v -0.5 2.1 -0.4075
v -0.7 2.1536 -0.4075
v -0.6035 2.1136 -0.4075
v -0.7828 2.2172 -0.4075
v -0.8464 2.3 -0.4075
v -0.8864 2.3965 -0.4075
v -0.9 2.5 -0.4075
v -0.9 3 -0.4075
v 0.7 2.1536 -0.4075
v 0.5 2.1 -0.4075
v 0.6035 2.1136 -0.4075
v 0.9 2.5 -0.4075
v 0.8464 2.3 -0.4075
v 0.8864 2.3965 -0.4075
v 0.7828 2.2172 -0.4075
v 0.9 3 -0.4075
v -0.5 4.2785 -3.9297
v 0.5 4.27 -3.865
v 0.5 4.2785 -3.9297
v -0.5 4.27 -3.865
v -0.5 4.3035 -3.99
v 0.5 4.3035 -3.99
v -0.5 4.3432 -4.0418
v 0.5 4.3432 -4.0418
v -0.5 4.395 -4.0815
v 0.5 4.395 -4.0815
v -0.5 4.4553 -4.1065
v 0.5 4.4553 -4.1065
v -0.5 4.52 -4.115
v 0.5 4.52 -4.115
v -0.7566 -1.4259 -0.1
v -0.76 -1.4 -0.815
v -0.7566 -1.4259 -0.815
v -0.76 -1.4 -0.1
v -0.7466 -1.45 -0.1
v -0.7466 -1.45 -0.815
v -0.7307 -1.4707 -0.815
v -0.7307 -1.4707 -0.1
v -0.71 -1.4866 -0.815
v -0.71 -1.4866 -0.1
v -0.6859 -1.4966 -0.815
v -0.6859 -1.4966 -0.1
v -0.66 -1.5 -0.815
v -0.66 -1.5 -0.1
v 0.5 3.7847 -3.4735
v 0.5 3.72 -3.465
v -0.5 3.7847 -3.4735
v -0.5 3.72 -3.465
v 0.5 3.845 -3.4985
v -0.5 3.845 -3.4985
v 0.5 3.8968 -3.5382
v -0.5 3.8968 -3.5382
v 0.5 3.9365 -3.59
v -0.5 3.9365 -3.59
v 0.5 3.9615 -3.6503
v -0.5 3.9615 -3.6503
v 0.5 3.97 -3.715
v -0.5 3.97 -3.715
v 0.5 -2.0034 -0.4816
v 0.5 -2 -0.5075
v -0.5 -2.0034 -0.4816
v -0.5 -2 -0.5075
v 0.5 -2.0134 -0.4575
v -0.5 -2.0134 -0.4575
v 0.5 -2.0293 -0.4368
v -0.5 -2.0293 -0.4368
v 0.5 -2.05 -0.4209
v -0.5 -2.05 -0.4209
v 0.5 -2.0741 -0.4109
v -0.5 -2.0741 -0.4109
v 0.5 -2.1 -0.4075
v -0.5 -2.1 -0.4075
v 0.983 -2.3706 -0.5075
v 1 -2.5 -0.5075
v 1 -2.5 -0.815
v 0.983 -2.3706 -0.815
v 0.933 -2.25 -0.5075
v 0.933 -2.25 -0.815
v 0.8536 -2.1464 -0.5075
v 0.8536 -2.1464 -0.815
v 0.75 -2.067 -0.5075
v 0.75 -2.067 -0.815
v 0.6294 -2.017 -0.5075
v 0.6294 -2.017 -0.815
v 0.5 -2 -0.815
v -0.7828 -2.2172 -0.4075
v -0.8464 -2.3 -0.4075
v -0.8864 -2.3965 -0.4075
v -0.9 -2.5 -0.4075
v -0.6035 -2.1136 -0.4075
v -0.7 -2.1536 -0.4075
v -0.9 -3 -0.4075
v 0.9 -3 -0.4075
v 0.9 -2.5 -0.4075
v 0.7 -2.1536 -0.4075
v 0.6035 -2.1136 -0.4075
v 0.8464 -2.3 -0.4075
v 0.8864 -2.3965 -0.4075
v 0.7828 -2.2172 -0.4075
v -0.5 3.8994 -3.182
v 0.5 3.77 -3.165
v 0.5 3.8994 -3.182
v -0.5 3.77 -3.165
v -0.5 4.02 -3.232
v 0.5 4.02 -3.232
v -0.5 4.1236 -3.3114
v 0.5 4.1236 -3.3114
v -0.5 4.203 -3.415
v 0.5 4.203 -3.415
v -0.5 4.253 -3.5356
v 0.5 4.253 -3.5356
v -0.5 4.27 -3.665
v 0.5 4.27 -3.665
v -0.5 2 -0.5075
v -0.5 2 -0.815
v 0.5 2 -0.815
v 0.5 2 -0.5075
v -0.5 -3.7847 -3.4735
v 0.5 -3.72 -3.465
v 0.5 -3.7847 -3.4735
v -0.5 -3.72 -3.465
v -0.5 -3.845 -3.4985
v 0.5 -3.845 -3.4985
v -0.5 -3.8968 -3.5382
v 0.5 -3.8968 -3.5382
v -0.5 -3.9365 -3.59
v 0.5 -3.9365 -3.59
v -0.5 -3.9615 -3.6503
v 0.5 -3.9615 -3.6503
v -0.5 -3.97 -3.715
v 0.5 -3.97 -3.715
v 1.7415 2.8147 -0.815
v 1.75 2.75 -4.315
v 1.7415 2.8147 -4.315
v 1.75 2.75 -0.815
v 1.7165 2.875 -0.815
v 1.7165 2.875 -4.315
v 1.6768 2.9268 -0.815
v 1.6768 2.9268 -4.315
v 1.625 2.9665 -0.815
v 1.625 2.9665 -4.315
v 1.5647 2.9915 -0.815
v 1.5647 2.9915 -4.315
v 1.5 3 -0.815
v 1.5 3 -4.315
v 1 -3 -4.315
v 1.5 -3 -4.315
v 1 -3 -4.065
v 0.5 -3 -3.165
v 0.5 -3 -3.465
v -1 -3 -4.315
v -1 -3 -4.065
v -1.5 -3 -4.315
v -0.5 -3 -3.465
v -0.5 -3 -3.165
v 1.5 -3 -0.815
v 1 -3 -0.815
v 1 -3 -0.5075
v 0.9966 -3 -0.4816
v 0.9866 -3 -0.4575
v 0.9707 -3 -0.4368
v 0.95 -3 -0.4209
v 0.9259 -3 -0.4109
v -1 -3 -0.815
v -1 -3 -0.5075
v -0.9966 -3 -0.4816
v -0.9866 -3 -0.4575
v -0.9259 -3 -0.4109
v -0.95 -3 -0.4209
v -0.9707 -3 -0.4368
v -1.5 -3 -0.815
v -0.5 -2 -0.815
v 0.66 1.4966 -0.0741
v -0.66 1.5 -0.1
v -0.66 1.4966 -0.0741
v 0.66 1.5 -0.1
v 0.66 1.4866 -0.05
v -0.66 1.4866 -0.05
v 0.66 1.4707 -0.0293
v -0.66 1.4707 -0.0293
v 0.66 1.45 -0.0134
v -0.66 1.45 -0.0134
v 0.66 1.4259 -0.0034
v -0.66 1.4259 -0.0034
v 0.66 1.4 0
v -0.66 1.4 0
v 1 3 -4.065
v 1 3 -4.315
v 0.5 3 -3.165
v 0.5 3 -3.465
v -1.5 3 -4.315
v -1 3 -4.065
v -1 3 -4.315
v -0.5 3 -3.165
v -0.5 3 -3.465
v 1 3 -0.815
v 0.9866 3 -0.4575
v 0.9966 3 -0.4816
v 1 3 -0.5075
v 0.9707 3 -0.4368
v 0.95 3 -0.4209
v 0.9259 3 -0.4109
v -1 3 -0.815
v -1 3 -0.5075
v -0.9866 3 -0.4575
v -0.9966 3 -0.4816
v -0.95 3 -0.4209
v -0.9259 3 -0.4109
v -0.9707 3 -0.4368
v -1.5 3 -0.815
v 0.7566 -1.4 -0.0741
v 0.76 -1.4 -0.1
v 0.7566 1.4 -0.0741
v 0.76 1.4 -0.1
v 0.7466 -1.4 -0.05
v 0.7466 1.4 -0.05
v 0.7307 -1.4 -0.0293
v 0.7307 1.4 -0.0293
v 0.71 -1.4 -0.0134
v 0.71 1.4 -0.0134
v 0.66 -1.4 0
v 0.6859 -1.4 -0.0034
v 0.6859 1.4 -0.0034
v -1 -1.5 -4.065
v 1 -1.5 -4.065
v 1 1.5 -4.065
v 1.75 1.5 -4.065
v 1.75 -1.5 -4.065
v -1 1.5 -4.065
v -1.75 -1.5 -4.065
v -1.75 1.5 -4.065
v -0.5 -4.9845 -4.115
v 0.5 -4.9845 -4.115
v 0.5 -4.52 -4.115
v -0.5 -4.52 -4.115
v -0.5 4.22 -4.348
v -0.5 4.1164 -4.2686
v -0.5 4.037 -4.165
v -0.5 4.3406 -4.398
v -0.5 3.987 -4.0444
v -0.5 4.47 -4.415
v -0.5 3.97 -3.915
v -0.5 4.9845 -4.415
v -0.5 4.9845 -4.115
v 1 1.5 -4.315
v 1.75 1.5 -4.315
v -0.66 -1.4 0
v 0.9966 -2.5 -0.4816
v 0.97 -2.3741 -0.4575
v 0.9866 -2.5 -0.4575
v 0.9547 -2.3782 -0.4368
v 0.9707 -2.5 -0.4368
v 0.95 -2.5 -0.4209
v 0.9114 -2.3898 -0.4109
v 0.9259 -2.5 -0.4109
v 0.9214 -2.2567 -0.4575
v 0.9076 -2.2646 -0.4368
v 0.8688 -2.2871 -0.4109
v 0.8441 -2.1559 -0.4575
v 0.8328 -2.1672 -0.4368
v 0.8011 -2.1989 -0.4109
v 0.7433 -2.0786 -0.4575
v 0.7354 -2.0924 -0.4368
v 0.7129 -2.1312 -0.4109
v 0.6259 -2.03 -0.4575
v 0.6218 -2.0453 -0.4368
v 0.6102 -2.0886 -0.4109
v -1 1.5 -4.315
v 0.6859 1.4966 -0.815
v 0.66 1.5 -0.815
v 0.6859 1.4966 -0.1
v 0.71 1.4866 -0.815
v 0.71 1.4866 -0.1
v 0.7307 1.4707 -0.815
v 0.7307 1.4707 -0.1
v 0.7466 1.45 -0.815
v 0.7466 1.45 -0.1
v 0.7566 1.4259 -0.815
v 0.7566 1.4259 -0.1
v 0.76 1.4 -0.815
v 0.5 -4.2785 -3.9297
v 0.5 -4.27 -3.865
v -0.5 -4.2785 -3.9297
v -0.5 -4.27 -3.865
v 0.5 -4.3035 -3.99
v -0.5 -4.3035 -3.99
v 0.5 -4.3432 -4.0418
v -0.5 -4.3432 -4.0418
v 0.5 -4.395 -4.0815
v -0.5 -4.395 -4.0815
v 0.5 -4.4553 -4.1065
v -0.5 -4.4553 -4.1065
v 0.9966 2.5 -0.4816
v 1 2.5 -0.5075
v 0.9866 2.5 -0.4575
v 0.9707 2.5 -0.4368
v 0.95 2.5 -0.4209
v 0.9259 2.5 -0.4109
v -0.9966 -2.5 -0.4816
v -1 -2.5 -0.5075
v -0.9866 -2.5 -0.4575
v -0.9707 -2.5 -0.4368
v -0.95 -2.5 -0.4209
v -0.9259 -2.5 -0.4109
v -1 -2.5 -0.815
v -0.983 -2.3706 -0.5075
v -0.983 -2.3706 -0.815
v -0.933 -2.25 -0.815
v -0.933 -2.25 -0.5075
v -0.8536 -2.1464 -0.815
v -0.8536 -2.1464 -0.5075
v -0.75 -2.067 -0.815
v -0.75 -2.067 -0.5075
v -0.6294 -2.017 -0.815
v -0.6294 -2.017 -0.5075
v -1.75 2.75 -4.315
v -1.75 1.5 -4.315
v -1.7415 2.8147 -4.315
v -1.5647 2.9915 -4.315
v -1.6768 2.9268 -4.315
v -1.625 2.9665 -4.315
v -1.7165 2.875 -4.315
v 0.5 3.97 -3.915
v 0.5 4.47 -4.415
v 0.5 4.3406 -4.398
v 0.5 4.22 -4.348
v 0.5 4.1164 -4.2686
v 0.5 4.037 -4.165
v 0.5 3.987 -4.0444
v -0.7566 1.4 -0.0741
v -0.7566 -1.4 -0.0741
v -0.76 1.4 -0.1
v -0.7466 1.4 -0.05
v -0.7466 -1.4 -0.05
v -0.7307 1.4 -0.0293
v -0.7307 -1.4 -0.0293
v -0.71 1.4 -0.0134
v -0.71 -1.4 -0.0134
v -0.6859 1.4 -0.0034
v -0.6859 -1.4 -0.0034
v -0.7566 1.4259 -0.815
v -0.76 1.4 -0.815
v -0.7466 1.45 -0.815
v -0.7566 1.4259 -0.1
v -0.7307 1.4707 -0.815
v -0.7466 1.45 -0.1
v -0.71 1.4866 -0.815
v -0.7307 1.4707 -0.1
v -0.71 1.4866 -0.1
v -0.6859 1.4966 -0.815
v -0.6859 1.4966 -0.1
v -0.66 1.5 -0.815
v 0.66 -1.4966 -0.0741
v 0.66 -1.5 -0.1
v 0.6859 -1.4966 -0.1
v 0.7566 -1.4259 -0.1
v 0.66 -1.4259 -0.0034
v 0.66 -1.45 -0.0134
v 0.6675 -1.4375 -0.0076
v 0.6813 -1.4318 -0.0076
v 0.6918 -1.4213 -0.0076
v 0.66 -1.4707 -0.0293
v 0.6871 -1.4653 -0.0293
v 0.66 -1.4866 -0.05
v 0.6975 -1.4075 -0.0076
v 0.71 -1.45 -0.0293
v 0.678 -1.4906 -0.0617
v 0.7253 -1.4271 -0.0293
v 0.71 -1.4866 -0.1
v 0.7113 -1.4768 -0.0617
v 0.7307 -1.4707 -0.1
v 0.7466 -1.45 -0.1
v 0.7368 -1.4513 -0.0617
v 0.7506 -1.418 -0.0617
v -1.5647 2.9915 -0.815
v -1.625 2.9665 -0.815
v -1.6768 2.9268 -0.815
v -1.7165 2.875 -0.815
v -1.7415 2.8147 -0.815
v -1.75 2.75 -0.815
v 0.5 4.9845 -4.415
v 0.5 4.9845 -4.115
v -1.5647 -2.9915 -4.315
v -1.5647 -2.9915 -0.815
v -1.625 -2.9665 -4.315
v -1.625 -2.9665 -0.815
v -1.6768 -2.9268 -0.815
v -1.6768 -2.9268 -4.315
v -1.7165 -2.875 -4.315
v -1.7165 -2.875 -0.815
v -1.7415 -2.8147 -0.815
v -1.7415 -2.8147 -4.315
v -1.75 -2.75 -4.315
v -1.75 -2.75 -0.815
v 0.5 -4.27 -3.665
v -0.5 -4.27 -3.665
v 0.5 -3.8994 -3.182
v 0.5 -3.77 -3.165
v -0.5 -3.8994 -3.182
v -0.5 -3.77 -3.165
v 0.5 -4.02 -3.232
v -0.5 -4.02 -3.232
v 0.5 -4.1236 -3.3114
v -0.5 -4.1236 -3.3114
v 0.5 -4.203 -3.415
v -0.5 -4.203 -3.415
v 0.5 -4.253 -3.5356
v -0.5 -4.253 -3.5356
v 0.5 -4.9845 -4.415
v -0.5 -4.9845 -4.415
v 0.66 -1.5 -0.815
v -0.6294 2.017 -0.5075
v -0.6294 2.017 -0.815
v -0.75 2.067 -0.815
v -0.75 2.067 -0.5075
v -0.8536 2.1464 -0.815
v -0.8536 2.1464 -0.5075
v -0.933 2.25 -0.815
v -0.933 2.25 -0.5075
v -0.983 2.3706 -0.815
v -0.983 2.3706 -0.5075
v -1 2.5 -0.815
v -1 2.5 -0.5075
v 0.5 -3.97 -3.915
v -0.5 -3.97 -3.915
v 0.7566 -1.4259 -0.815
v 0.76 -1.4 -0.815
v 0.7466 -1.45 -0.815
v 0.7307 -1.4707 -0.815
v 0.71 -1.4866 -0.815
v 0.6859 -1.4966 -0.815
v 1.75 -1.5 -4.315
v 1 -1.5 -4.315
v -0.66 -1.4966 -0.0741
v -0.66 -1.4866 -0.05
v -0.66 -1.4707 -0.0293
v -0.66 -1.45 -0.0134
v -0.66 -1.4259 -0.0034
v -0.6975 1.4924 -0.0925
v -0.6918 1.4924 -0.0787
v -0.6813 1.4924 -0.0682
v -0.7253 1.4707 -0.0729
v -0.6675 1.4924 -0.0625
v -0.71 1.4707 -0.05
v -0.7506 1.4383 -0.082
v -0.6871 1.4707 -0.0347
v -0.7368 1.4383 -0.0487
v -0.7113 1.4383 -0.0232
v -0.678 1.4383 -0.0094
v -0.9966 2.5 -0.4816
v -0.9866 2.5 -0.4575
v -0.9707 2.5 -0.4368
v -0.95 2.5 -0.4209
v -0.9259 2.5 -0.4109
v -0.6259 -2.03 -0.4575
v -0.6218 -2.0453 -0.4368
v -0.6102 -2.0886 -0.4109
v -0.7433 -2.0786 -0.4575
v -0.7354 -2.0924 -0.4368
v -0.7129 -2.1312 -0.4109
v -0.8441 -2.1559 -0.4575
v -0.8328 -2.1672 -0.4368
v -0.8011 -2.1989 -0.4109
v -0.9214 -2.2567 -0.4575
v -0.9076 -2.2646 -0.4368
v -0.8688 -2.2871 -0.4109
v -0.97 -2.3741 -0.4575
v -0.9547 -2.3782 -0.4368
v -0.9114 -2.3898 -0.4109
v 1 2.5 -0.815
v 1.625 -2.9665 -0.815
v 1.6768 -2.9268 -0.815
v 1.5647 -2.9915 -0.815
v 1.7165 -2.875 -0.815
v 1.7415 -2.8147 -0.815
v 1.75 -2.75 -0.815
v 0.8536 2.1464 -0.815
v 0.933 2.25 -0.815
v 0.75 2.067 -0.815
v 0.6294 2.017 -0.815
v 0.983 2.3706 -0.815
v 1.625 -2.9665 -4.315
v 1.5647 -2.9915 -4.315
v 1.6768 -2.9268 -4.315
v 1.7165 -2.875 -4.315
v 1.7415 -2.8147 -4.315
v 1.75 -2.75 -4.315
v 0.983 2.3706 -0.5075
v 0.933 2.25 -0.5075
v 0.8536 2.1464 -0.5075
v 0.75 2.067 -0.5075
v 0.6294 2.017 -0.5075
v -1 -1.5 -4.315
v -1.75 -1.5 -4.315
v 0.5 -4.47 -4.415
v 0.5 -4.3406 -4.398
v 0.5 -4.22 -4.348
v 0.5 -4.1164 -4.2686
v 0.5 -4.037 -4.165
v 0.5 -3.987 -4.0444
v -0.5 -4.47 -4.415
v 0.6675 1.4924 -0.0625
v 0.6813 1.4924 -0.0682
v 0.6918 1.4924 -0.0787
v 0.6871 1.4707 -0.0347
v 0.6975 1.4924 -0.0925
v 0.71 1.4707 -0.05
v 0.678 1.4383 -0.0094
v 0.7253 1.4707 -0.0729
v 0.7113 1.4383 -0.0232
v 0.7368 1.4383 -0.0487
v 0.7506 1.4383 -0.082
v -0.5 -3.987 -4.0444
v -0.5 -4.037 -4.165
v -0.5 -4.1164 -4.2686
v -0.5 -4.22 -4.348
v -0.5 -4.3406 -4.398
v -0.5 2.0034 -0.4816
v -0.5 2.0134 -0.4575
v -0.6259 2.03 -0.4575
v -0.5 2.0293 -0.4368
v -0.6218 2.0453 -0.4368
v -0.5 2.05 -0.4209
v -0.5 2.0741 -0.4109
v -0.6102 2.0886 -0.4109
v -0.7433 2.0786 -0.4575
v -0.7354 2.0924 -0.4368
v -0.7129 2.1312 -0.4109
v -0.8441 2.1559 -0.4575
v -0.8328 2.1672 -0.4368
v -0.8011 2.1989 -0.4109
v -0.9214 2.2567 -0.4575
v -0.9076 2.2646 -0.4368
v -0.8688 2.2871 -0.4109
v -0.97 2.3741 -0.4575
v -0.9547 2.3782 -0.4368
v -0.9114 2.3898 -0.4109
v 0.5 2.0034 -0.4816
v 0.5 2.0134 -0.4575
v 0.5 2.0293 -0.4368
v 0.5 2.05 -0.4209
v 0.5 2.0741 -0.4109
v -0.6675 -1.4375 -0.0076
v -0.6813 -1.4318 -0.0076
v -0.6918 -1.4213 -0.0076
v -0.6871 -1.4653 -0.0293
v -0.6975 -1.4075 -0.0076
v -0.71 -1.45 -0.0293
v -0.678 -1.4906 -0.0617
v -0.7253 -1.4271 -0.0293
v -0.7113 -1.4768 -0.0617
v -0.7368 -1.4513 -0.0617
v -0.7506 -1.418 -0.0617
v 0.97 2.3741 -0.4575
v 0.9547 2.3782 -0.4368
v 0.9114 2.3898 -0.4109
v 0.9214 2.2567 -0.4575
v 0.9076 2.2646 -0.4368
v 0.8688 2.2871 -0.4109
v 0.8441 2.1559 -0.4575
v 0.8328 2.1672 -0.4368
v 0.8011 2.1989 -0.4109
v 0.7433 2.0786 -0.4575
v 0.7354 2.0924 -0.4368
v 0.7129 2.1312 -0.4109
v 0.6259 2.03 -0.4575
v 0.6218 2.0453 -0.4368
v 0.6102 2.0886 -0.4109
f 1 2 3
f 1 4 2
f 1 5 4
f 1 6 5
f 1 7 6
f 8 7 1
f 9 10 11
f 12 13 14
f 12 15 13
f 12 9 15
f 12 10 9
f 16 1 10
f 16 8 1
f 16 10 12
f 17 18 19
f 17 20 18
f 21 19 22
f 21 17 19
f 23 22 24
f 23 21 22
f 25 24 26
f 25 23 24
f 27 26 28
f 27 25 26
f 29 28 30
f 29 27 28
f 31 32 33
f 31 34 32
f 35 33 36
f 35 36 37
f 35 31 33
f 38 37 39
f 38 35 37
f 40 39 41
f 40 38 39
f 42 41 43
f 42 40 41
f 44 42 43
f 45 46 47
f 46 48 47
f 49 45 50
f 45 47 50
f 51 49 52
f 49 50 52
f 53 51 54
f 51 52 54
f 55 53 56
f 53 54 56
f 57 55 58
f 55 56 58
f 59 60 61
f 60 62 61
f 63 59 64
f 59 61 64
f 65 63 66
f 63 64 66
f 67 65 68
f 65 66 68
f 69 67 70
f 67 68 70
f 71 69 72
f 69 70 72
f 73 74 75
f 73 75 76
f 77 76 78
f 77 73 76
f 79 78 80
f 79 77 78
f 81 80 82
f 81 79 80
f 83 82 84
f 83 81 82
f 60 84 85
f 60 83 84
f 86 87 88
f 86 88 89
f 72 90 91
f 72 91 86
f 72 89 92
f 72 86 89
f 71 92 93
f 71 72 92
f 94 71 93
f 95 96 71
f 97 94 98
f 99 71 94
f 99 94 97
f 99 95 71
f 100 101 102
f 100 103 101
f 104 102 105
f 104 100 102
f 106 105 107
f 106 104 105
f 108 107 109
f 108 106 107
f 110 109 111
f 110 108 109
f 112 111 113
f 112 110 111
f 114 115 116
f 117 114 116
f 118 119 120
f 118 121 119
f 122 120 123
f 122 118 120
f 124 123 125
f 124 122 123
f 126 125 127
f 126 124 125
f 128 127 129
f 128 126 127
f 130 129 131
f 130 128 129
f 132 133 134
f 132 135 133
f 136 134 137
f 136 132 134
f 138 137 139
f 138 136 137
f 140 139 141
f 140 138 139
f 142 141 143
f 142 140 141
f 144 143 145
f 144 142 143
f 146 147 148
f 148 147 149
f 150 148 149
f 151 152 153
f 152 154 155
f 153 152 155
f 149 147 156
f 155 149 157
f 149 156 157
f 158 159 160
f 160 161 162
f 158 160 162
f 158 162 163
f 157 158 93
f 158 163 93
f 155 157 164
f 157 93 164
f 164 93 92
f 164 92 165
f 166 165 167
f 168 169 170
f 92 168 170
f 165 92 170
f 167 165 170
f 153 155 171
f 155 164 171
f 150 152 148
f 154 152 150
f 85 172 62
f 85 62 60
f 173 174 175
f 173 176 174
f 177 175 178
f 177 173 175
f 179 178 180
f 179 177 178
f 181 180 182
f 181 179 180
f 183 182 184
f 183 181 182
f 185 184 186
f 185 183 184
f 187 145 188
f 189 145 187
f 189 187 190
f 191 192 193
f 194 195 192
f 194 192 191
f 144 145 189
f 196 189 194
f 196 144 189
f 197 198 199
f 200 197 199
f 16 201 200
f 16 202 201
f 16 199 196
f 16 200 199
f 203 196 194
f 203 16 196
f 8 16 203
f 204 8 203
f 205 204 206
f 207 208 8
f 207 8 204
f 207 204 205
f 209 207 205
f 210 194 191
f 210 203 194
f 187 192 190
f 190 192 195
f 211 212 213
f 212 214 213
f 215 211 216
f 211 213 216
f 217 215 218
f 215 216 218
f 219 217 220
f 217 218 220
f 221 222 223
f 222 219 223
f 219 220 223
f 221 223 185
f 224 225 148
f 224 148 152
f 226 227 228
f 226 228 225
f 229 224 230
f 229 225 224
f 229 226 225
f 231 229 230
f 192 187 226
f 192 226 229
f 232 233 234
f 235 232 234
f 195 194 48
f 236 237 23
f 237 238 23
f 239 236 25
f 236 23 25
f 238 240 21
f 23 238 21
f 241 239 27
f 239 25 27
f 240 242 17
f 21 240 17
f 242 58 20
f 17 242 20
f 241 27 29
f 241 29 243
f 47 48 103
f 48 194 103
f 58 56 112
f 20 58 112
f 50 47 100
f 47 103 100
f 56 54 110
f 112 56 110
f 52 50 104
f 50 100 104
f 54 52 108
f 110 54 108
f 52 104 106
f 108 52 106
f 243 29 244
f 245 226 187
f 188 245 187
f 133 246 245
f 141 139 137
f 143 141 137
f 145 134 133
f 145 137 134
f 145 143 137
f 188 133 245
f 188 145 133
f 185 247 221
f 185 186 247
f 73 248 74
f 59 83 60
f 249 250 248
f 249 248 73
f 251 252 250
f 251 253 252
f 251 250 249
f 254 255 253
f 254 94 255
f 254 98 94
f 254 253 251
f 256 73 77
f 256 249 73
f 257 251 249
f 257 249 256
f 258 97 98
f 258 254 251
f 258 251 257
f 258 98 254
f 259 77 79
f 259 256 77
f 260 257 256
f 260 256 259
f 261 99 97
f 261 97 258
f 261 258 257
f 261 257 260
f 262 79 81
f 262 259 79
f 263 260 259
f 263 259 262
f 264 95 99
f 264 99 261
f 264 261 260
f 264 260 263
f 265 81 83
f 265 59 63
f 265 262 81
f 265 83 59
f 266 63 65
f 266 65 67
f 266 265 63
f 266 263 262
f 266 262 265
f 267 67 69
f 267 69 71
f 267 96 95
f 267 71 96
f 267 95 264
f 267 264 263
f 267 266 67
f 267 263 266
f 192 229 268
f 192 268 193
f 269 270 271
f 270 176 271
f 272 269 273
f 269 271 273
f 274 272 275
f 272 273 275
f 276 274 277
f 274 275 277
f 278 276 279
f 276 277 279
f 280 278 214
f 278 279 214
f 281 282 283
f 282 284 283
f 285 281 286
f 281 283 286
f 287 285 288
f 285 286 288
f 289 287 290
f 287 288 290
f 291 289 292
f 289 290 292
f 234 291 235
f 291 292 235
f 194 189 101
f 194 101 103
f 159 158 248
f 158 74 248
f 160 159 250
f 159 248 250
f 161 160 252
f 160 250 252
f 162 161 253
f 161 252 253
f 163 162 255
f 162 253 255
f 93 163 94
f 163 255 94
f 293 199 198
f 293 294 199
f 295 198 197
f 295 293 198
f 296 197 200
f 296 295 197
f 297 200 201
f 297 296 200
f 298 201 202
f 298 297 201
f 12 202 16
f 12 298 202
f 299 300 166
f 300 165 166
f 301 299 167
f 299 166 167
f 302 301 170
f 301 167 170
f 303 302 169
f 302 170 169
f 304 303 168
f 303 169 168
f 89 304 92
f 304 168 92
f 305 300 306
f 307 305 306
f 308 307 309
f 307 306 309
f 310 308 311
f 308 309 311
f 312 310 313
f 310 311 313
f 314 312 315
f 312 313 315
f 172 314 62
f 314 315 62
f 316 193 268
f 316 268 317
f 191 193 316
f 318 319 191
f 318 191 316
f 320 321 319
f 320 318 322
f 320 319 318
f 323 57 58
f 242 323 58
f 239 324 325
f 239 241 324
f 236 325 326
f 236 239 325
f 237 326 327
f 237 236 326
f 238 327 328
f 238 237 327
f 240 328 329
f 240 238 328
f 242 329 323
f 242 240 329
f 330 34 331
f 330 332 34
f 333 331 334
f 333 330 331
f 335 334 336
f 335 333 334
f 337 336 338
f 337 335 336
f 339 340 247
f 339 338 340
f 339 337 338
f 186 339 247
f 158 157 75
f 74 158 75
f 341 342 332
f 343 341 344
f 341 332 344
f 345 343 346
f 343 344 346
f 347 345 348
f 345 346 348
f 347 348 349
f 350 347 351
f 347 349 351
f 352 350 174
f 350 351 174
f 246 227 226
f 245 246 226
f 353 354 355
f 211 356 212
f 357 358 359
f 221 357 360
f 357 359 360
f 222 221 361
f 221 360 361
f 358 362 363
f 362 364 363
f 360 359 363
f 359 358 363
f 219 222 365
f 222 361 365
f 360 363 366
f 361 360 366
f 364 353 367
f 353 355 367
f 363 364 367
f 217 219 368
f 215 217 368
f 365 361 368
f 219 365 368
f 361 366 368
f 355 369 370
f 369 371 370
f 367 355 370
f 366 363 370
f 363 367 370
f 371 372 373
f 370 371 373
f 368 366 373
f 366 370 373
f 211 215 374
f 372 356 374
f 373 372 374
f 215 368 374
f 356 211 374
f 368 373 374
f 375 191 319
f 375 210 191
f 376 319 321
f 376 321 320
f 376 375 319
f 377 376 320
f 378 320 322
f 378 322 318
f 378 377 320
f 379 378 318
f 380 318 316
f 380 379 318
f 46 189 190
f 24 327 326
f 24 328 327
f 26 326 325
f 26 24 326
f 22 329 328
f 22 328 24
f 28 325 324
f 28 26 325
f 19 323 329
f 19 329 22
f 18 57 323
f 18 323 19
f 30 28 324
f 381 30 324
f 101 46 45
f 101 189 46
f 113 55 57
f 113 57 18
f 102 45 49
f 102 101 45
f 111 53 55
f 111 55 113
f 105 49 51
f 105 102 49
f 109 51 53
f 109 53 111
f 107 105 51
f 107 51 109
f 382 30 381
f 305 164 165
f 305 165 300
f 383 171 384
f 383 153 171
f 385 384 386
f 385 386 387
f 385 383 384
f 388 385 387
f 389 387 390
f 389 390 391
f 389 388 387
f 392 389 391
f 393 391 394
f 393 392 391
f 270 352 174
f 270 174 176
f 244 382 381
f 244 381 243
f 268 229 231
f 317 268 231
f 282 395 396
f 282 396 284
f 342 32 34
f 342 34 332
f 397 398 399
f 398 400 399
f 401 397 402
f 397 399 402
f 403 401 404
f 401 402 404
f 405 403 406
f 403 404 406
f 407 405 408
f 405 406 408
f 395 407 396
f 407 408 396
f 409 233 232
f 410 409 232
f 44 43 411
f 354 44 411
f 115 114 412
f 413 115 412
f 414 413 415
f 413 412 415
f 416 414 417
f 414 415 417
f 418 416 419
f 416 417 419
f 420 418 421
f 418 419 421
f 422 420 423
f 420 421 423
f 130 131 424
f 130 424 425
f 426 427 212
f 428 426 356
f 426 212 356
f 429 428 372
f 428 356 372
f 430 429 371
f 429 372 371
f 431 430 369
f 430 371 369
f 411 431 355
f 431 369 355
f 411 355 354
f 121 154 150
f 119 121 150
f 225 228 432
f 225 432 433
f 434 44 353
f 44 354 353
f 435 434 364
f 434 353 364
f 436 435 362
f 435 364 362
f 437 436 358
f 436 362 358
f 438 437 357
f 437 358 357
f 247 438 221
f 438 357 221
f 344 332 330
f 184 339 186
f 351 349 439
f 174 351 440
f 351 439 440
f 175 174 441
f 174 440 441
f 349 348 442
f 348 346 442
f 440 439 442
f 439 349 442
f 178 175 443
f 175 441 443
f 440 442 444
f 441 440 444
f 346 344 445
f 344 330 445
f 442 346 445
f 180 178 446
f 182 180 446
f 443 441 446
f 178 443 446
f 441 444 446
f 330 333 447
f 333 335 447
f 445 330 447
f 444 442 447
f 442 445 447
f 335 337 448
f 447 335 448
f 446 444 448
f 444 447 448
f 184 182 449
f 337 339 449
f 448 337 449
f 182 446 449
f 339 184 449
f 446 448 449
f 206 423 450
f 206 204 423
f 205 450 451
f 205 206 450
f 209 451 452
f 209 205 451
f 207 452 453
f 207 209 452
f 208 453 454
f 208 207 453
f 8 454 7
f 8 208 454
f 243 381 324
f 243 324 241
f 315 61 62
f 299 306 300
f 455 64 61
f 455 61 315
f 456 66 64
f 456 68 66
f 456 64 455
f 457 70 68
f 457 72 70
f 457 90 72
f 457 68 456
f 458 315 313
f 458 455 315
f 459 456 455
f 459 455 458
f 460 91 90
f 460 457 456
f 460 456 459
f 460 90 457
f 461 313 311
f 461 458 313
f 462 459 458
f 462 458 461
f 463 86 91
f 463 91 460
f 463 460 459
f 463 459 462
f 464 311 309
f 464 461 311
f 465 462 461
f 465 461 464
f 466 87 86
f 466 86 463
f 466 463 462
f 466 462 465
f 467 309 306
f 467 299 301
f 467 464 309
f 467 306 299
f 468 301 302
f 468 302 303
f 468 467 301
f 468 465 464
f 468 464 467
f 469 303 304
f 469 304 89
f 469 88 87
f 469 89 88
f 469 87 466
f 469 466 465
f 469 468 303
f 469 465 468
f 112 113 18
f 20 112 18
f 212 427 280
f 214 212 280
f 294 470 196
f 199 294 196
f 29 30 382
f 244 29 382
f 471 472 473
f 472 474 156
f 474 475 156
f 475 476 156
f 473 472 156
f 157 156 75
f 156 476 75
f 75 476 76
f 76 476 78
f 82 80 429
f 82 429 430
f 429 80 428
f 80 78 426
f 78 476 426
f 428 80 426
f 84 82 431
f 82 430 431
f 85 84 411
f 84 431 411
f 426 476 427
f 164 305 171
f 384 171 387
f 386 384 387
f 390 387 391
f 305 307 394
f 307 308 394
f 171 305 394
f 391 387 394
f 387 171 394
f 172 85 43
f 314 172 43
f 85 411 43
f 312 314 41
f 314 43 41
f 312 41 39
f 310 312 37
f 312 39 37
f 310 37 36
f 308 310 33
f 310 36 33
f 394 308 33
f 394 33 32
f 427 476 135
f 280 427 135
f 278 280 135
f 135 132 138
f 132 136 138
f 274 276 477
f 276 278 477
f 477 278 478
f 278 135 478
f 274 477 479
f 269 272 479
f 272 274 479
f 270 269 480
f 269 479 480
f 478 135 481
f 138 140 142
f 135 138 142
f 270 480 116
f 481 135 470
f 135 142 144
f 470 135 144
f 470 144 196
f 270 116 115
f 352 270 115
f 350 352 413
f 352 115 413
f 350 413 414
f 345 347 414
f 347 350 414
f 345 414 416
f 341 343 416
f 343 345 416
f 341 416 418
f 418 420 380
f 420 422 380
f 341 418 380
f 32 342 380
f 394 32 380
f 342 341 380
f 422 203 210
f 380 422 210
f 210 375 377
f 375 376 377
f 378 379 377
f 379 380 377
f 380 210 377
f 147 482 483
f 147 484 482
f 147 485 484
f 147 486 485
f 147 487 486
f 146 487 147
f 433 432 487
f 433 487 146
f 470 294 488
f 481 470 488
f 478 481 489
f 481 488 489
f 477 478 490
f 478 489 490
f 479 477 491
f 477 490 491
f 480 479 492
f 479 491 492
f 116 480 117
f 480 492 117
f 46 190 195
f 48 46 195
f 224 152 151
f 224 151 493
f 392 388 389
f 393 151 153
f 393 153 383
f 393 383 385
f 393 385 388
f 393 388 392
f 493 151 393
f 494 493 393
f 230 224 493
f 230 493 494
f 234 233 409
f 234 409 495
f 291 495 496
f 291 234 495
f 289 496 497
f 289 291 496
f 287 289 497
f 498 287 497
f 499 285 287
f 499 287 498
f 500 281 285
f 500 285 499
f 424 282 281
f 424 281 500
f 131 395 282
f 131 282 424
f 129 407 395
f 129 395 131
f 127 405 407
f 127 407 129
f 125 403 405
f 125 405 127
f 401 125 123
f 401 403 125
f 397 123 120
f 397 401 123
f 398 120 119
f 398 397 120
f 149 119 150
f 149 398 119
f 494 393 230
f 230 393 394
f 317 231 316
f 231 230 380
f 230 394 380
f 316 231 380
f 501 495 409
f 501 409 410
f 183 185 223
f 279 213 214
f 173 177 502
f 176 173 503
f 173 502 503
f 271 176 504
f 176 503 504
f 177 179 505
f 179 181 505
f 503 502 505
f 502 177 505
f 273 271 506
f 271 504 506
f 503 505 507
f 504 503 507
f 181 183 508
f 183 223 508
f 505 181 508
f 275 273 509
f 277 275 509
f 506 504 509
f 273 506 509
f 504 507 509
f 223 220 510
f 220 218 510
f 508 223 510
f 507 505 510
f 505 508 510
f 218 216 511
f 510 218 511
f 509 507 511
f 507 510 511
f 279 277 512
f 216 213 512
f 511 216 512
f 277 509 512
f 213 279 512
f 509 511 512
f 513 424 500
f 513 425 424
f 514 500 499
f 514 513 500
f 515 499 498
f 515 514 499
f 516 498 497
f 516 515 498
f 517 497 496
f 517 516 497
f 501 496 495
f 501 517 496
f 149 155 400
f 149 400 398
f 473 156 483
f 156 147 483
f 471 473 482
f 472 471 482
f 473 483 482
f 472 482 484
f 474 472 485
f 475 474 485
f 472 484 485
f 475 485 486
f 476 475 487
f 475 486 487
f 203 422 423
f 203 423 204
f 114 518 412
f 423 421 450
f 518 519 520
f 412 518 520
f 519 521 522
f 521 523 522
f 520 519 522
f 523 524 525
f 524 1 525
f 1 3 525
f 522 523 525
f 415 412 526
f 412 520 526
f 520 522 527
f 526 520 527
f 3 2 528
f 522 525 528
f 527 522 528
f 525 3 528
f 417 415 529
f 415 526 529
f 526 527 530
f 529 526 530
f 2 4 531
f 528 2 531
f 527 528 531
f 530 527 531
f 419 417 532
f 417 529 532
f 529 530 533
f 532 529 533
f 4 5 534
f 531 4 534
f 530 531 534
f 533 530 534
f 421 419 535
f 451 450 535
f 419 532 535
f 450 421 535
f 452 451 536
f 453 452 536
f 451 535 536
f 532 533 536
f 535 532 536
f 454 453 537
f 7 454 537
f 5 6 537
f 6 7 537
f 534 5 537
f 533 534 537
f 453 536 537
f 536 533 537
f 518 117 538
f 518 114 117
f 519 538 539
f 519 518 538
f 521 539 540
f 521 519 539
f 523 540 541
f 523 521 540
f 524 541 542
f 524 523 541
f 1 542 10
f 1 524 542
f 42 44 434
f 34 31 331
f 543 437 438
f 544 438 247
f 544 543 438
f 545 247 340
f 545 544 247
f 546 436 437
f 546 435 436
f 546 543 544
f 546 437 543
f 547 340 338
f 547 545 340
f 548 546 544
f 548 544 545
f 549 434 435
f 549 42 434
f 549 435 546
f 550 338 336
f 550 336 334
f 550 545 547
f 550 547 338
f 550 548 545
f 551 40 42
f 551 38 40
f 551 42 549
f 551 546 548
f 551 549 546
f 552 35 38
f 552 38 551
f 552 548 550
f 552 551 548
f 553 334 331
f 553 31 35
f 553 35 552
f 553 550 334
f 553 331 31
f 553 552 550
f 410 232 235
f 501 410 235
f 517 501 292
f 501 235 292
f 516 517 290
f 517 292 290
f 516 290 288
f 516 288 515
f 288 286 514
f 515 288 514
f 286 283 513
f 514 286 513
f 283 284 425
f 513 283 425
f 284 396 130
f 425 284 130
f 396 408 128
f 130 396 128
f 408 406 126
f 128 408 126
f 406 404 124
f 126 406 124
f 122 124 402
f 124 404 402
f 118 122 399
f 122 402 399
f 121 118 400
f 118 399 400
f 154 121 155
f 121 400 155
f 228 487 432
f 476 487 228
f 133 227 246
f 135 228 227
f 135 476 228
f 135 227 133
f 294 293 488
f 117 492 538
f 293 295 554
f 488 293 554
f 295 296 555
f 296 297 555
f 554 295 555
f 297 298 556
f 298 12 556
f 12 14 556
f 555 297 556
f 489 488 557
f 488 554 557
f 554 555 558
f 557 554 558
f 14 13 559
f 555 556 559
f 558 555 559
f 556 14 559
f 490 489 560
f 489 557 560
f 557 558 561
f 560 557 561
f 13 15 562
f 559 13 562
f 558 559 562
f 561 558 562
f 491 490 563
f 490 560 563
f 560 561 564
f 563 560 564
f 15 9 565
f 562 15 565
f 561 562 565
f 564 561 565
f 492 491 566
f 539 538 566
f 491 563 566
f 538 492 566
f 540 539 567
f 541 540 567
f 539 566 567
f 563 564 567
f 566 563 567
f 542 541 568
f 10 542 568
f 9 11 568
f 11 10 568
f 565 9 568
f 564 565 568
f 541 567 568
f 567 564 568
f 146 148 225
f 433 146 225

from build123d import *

# Parameters (mm, degrees)
SKETCH1_W            = 3.5
SKETCH1_H            = 6
BOSS_EXTRUDE1_DEPTH  = 3.25
SKETCH2_W            = 1
SKETCH2_H            = 0.3
BOSS_EXTRUDE2_DEPTH  = 1.9845
SKETCH3_W            = 1
SKETCH3_H            = 1.0145
BOSS_EXTRUDE3_DEPTH  = 0.95
SKETCH4_W            = 1
SKETCH4_H            = 0.3
BOSS_EXTRUDE4_DEPTH  = 1.9845
SKETCH5_W            = 1
SKETCH5_H            = 1.0145
BOSS_EXTRUDE5_DEPTH  = 0.95
SKETCH6_W            = 0.95
SKETCH6_H            = 0.7145
CUT_EXTRUDE1_DEPTH   = 8.028510884
SKETCH7_W            = 0.95
SKETCH7_H            = 0.7145
CUT_EXTRUDE2_DEPTH   = 8.028510884
SKETCH8_W            = 0.75
SKETCH8_H            = 1.5
BOSS_EXTRUDE6_DEPTH  = 0.25
SKETCH9_W            = 0.75
SKETCH9_H            = 1.5
BOSS_EXTRUDE7_DEPTH  = 0.25
SKETCH10_W           = 0.75
SKETCH10_H           = 1.5
BOSS_EXTRUDE8_DEPTH  = 0.25
SKETCH11_W           = 0.75
SKETCH11_H           = 1.5
BOSS_EXTRUDE9_DEPTH  = 0.25
SKETCH12_W           = 2
SKETCH12_H           = 1
BOSS_EXTRUDE10_DEPTH = 0.4075
SKETCH13_W           = 2
SKETCH13_H           = 1
BOSS_EXTRUDE11_DEPTH = 0.4075
SKETCH14_W           = 1.52
SKETCH14_H           = 3
BOSS_EXTRUDE12_DEPTH = 0.815
FILLET1_R            = 0.5
FILLET2_R            = 0.1
FILLET3_R            = 0.25


with BuildPart() as part:
    # Sketch1 → Boss-Extrude1 (new body)
    with BuildSketch(Plane(origin=(0, 0, -4.065), x_dir=(-1, 0, 0), z_dir=(0, 0, -1))):
        Rectangle(SKETCH1_W, SKETCH1_H)
    extrude(amount=-BOSS_EXTRUDE1_DEPTH)

    # Sketch2 → Boss-Extrude2 (add)
    with BuildSketch(Plane(origin=(0, 3, 0), x_dir=(-1, 0, 0), z_dir=(0, 1, 0))):
        with Locations((0, -3.315)):
            Rectangle(SKETCH2_W, SKETCH2_H)
    extrude(amount=BOSS_EXTRUDE2_DEPTH)

    # Sketch3 → Boss-Extrude3 (add)
    with BuildSketch(Plane(origin=(0, 0, -3.465), x_dir=(-1, 0, 0), z_dir=(0, 0, -1))):
        with Locations((0, 4.47725)):
            Rectangle(SKETCH3_W, SKETCH3_H)
    extrude(amount=BOSS_EXTRUDE3_DEPTH)

    # Sketch4 → Boss-Extrude4 (add)
    with BuildSketch(Plane.XZ.offset(3)):
        with Locations((0, -3.315)):
            Rectangle(SKETCH4_W, SKETCH4_H)
    extrude(amount=BOSS_EXTRUDE4_DEPTH)

    # Sketch5 → Boss-Extrude5 (add)
    with BuildSketch(Plane(origin=(0, 0, -3.465), x_dir=(-1, 0, 0), z_dir=(0, 0, -1))):
        with Locations((0, -4.47725)):
            Rectangle(SKETCH5_W, SKETCH5_H)
    extrude(amount=BOSS_EXTRUDE5_DEPTH)

    # Sketch6 → Cut-Extrude1 (cut, through all)
    with BuildSketch(Plane(origin=(0.5, 0, 0), x_dir=(0, 0, -1), z_dir=(1, 0, 0))):
        with Locations((3.64, 4.62725)):
            Rectangle(SKETCH6_W, SKETCH6_H)
    extrude(amount=-CUT_EXTRUDE1_DEPTH, mode=Mode.SUBTRACT)

    # Sketch7 → Cut-Extrude2 (cut, through all)
    with BuildSketch(Plane(origin=(0.5, 0, 0), x_dir=(0, 0, -1), z_dir=(1, 0, 0))):
        with Locations((3.64, -4.62725)):
            Rectangle(SKETCH7_W, SKETCH7_H)
    extrude(amount=-CUT_EXTRUDE2_DEPTH, mode=Mode.SUBTRACT)

    # Sketch8 → Boss-Extrude6 (add)
    with BuildSketch(Plane(origin=(0, 0, -4.065), x_dir=(-1, 0, 0), z_dir=(0, 0, -1))):
        with Locations((-1.375, 2.25)):
            Rectangle(SKETCH8_W, SKETCH8_H)
    extrude(amount=BOSS_EXTRUDE6_DEPTH)

    # Sketch9 → Boss-Extrude7 (add)
    with BuildSketch(Plane(origin=(0, 0, -4.065), x_dir=(-1, 0, 0), z_dir=(0, 0, -1))):
        with Locations((-1.375, -2.25)):
            Rectangle(SKETCH9_W, SKETCH9_H)
    extrude(amount=BOSS_EXTRUDE7_DEPTH)

    # Sketch10 → Boss-Extrude8 (add)
    with BuildSketch(Plane(origin=(0, 0, -4.065), x_dir=(-1, 0, 0), z_dir=(0, 0, -1))):
        with Locations((1.375, 2.25)):
            Rectangle(SKETCH10_W, SKETCH10_H)
    extrude(amount=BOSS_EXTRUDE8_DEPTH)

    # Sketch11 → Boss-Extrude9 (add)
    with BuildSketch(Plane(origin=(0, 0, -4.065), x_dir=(-1, 0, 0), z_dir=(0, 0, -1))):
        with Locations((1.375, -2.25)):
            Rectangle(SKETCH11_W, SKETCH11_H)
    extrude(amount=BOSS_EXTRUDE9_DEPTH)

    # Sketch12 → Boss-Extrude10 (add)
    with BuildSketch(Plane.XY.offset(-0.815)):
        with Locations((0, -2.5)):
            Rectangle(SKETCH12_W, SKETCH12_H)
    extrude(amount=BOSS_EXTRUDE10_DEPTH)

    # Sketch13 → Boss-Extrude11 (add)
    with BuildSketch(Plane.XY.offset(-0.815)):
        with Locations((0, 2.5)):
            Rectangle(SKETCH13_W, SKETCH13_H)
    extrude(amount=BOSS_EXTRUDE11_DEPTH)

    # Sketch14 → Boss-Extrude12 (add)
    with BuildSketch(Plane.XY.offset(-0.815)):
        Rectangle(SKETCH14_W, SKETCH14_H)
    extrude(amount=BOSS_EXTRUDE12_DEPTH)

    # Fillet1
    fillet1_edges = [part.edges().sort_by_distance(p)[0] for p in [
        (0, 3.97, -4.415),
        (0, 4.27, -3.165),
        (0, -4.27, -3.165),
        (0, -3.97, -4.415),
        (-1, 2, -0.61125),
        (1, -2, -0.61125),
        (-1, -2, -0.61125),
        (1, 2, -0.61125),
    ]]
    fillet(fillet1_edges, radius=FILLET1_R)

    # Fillet2
    fillet2_edges = [part.edges().sort_by_distance(p)[0] for p in [
        (-0.76, -1.5, -0.4075),
        (0.76, -1.5, -0.4075),
        (0, -1.5, 0),
        (-0.76, 0, 0),
        (-0.76, 1.5, -0.4075),
        (0.76, 0, 0),
        (0, 1.5, 0),
        (0.76, 1.5, -0.4075),
        (-1, 2.75, -0.4075),
        (-0.853553391, 2.146446609, -0.4075),
        (0, 2, -0.4075),
        (0.853553391, 2.146446609, -0.4075),
        (1, 2.75, -0.4075),
        (1, -2.75, -0.4075),
        (0.853553391, -2.146446609, -0.4075),
        (0, -2, -0.4075),
        (-1, -2.75, -0.4075),
        (-0.853553391, -2.146446609, -0.4075),
    ]]
    fillet(fillet2_edges, radius=FILLET2_R)

    # Fillet3
    fillet3_edges = [part.edges().sort_by_distance(p)[0] for p in [
        (0, -4.27, -4.115),
        (-1.75, -3, -2.565),
        (-1.75, 3, -2.565),
        (1.75, -3, -2.565),
        (1.75, 3, -2.565),
        (0, 4.27, -4.115),
        (0, -3.97, -3.465),
        (0, 3.97, -3.465),
    ]]
    fillet(fillet3_edges, radius=FILLET3_R)


solid = part.part
